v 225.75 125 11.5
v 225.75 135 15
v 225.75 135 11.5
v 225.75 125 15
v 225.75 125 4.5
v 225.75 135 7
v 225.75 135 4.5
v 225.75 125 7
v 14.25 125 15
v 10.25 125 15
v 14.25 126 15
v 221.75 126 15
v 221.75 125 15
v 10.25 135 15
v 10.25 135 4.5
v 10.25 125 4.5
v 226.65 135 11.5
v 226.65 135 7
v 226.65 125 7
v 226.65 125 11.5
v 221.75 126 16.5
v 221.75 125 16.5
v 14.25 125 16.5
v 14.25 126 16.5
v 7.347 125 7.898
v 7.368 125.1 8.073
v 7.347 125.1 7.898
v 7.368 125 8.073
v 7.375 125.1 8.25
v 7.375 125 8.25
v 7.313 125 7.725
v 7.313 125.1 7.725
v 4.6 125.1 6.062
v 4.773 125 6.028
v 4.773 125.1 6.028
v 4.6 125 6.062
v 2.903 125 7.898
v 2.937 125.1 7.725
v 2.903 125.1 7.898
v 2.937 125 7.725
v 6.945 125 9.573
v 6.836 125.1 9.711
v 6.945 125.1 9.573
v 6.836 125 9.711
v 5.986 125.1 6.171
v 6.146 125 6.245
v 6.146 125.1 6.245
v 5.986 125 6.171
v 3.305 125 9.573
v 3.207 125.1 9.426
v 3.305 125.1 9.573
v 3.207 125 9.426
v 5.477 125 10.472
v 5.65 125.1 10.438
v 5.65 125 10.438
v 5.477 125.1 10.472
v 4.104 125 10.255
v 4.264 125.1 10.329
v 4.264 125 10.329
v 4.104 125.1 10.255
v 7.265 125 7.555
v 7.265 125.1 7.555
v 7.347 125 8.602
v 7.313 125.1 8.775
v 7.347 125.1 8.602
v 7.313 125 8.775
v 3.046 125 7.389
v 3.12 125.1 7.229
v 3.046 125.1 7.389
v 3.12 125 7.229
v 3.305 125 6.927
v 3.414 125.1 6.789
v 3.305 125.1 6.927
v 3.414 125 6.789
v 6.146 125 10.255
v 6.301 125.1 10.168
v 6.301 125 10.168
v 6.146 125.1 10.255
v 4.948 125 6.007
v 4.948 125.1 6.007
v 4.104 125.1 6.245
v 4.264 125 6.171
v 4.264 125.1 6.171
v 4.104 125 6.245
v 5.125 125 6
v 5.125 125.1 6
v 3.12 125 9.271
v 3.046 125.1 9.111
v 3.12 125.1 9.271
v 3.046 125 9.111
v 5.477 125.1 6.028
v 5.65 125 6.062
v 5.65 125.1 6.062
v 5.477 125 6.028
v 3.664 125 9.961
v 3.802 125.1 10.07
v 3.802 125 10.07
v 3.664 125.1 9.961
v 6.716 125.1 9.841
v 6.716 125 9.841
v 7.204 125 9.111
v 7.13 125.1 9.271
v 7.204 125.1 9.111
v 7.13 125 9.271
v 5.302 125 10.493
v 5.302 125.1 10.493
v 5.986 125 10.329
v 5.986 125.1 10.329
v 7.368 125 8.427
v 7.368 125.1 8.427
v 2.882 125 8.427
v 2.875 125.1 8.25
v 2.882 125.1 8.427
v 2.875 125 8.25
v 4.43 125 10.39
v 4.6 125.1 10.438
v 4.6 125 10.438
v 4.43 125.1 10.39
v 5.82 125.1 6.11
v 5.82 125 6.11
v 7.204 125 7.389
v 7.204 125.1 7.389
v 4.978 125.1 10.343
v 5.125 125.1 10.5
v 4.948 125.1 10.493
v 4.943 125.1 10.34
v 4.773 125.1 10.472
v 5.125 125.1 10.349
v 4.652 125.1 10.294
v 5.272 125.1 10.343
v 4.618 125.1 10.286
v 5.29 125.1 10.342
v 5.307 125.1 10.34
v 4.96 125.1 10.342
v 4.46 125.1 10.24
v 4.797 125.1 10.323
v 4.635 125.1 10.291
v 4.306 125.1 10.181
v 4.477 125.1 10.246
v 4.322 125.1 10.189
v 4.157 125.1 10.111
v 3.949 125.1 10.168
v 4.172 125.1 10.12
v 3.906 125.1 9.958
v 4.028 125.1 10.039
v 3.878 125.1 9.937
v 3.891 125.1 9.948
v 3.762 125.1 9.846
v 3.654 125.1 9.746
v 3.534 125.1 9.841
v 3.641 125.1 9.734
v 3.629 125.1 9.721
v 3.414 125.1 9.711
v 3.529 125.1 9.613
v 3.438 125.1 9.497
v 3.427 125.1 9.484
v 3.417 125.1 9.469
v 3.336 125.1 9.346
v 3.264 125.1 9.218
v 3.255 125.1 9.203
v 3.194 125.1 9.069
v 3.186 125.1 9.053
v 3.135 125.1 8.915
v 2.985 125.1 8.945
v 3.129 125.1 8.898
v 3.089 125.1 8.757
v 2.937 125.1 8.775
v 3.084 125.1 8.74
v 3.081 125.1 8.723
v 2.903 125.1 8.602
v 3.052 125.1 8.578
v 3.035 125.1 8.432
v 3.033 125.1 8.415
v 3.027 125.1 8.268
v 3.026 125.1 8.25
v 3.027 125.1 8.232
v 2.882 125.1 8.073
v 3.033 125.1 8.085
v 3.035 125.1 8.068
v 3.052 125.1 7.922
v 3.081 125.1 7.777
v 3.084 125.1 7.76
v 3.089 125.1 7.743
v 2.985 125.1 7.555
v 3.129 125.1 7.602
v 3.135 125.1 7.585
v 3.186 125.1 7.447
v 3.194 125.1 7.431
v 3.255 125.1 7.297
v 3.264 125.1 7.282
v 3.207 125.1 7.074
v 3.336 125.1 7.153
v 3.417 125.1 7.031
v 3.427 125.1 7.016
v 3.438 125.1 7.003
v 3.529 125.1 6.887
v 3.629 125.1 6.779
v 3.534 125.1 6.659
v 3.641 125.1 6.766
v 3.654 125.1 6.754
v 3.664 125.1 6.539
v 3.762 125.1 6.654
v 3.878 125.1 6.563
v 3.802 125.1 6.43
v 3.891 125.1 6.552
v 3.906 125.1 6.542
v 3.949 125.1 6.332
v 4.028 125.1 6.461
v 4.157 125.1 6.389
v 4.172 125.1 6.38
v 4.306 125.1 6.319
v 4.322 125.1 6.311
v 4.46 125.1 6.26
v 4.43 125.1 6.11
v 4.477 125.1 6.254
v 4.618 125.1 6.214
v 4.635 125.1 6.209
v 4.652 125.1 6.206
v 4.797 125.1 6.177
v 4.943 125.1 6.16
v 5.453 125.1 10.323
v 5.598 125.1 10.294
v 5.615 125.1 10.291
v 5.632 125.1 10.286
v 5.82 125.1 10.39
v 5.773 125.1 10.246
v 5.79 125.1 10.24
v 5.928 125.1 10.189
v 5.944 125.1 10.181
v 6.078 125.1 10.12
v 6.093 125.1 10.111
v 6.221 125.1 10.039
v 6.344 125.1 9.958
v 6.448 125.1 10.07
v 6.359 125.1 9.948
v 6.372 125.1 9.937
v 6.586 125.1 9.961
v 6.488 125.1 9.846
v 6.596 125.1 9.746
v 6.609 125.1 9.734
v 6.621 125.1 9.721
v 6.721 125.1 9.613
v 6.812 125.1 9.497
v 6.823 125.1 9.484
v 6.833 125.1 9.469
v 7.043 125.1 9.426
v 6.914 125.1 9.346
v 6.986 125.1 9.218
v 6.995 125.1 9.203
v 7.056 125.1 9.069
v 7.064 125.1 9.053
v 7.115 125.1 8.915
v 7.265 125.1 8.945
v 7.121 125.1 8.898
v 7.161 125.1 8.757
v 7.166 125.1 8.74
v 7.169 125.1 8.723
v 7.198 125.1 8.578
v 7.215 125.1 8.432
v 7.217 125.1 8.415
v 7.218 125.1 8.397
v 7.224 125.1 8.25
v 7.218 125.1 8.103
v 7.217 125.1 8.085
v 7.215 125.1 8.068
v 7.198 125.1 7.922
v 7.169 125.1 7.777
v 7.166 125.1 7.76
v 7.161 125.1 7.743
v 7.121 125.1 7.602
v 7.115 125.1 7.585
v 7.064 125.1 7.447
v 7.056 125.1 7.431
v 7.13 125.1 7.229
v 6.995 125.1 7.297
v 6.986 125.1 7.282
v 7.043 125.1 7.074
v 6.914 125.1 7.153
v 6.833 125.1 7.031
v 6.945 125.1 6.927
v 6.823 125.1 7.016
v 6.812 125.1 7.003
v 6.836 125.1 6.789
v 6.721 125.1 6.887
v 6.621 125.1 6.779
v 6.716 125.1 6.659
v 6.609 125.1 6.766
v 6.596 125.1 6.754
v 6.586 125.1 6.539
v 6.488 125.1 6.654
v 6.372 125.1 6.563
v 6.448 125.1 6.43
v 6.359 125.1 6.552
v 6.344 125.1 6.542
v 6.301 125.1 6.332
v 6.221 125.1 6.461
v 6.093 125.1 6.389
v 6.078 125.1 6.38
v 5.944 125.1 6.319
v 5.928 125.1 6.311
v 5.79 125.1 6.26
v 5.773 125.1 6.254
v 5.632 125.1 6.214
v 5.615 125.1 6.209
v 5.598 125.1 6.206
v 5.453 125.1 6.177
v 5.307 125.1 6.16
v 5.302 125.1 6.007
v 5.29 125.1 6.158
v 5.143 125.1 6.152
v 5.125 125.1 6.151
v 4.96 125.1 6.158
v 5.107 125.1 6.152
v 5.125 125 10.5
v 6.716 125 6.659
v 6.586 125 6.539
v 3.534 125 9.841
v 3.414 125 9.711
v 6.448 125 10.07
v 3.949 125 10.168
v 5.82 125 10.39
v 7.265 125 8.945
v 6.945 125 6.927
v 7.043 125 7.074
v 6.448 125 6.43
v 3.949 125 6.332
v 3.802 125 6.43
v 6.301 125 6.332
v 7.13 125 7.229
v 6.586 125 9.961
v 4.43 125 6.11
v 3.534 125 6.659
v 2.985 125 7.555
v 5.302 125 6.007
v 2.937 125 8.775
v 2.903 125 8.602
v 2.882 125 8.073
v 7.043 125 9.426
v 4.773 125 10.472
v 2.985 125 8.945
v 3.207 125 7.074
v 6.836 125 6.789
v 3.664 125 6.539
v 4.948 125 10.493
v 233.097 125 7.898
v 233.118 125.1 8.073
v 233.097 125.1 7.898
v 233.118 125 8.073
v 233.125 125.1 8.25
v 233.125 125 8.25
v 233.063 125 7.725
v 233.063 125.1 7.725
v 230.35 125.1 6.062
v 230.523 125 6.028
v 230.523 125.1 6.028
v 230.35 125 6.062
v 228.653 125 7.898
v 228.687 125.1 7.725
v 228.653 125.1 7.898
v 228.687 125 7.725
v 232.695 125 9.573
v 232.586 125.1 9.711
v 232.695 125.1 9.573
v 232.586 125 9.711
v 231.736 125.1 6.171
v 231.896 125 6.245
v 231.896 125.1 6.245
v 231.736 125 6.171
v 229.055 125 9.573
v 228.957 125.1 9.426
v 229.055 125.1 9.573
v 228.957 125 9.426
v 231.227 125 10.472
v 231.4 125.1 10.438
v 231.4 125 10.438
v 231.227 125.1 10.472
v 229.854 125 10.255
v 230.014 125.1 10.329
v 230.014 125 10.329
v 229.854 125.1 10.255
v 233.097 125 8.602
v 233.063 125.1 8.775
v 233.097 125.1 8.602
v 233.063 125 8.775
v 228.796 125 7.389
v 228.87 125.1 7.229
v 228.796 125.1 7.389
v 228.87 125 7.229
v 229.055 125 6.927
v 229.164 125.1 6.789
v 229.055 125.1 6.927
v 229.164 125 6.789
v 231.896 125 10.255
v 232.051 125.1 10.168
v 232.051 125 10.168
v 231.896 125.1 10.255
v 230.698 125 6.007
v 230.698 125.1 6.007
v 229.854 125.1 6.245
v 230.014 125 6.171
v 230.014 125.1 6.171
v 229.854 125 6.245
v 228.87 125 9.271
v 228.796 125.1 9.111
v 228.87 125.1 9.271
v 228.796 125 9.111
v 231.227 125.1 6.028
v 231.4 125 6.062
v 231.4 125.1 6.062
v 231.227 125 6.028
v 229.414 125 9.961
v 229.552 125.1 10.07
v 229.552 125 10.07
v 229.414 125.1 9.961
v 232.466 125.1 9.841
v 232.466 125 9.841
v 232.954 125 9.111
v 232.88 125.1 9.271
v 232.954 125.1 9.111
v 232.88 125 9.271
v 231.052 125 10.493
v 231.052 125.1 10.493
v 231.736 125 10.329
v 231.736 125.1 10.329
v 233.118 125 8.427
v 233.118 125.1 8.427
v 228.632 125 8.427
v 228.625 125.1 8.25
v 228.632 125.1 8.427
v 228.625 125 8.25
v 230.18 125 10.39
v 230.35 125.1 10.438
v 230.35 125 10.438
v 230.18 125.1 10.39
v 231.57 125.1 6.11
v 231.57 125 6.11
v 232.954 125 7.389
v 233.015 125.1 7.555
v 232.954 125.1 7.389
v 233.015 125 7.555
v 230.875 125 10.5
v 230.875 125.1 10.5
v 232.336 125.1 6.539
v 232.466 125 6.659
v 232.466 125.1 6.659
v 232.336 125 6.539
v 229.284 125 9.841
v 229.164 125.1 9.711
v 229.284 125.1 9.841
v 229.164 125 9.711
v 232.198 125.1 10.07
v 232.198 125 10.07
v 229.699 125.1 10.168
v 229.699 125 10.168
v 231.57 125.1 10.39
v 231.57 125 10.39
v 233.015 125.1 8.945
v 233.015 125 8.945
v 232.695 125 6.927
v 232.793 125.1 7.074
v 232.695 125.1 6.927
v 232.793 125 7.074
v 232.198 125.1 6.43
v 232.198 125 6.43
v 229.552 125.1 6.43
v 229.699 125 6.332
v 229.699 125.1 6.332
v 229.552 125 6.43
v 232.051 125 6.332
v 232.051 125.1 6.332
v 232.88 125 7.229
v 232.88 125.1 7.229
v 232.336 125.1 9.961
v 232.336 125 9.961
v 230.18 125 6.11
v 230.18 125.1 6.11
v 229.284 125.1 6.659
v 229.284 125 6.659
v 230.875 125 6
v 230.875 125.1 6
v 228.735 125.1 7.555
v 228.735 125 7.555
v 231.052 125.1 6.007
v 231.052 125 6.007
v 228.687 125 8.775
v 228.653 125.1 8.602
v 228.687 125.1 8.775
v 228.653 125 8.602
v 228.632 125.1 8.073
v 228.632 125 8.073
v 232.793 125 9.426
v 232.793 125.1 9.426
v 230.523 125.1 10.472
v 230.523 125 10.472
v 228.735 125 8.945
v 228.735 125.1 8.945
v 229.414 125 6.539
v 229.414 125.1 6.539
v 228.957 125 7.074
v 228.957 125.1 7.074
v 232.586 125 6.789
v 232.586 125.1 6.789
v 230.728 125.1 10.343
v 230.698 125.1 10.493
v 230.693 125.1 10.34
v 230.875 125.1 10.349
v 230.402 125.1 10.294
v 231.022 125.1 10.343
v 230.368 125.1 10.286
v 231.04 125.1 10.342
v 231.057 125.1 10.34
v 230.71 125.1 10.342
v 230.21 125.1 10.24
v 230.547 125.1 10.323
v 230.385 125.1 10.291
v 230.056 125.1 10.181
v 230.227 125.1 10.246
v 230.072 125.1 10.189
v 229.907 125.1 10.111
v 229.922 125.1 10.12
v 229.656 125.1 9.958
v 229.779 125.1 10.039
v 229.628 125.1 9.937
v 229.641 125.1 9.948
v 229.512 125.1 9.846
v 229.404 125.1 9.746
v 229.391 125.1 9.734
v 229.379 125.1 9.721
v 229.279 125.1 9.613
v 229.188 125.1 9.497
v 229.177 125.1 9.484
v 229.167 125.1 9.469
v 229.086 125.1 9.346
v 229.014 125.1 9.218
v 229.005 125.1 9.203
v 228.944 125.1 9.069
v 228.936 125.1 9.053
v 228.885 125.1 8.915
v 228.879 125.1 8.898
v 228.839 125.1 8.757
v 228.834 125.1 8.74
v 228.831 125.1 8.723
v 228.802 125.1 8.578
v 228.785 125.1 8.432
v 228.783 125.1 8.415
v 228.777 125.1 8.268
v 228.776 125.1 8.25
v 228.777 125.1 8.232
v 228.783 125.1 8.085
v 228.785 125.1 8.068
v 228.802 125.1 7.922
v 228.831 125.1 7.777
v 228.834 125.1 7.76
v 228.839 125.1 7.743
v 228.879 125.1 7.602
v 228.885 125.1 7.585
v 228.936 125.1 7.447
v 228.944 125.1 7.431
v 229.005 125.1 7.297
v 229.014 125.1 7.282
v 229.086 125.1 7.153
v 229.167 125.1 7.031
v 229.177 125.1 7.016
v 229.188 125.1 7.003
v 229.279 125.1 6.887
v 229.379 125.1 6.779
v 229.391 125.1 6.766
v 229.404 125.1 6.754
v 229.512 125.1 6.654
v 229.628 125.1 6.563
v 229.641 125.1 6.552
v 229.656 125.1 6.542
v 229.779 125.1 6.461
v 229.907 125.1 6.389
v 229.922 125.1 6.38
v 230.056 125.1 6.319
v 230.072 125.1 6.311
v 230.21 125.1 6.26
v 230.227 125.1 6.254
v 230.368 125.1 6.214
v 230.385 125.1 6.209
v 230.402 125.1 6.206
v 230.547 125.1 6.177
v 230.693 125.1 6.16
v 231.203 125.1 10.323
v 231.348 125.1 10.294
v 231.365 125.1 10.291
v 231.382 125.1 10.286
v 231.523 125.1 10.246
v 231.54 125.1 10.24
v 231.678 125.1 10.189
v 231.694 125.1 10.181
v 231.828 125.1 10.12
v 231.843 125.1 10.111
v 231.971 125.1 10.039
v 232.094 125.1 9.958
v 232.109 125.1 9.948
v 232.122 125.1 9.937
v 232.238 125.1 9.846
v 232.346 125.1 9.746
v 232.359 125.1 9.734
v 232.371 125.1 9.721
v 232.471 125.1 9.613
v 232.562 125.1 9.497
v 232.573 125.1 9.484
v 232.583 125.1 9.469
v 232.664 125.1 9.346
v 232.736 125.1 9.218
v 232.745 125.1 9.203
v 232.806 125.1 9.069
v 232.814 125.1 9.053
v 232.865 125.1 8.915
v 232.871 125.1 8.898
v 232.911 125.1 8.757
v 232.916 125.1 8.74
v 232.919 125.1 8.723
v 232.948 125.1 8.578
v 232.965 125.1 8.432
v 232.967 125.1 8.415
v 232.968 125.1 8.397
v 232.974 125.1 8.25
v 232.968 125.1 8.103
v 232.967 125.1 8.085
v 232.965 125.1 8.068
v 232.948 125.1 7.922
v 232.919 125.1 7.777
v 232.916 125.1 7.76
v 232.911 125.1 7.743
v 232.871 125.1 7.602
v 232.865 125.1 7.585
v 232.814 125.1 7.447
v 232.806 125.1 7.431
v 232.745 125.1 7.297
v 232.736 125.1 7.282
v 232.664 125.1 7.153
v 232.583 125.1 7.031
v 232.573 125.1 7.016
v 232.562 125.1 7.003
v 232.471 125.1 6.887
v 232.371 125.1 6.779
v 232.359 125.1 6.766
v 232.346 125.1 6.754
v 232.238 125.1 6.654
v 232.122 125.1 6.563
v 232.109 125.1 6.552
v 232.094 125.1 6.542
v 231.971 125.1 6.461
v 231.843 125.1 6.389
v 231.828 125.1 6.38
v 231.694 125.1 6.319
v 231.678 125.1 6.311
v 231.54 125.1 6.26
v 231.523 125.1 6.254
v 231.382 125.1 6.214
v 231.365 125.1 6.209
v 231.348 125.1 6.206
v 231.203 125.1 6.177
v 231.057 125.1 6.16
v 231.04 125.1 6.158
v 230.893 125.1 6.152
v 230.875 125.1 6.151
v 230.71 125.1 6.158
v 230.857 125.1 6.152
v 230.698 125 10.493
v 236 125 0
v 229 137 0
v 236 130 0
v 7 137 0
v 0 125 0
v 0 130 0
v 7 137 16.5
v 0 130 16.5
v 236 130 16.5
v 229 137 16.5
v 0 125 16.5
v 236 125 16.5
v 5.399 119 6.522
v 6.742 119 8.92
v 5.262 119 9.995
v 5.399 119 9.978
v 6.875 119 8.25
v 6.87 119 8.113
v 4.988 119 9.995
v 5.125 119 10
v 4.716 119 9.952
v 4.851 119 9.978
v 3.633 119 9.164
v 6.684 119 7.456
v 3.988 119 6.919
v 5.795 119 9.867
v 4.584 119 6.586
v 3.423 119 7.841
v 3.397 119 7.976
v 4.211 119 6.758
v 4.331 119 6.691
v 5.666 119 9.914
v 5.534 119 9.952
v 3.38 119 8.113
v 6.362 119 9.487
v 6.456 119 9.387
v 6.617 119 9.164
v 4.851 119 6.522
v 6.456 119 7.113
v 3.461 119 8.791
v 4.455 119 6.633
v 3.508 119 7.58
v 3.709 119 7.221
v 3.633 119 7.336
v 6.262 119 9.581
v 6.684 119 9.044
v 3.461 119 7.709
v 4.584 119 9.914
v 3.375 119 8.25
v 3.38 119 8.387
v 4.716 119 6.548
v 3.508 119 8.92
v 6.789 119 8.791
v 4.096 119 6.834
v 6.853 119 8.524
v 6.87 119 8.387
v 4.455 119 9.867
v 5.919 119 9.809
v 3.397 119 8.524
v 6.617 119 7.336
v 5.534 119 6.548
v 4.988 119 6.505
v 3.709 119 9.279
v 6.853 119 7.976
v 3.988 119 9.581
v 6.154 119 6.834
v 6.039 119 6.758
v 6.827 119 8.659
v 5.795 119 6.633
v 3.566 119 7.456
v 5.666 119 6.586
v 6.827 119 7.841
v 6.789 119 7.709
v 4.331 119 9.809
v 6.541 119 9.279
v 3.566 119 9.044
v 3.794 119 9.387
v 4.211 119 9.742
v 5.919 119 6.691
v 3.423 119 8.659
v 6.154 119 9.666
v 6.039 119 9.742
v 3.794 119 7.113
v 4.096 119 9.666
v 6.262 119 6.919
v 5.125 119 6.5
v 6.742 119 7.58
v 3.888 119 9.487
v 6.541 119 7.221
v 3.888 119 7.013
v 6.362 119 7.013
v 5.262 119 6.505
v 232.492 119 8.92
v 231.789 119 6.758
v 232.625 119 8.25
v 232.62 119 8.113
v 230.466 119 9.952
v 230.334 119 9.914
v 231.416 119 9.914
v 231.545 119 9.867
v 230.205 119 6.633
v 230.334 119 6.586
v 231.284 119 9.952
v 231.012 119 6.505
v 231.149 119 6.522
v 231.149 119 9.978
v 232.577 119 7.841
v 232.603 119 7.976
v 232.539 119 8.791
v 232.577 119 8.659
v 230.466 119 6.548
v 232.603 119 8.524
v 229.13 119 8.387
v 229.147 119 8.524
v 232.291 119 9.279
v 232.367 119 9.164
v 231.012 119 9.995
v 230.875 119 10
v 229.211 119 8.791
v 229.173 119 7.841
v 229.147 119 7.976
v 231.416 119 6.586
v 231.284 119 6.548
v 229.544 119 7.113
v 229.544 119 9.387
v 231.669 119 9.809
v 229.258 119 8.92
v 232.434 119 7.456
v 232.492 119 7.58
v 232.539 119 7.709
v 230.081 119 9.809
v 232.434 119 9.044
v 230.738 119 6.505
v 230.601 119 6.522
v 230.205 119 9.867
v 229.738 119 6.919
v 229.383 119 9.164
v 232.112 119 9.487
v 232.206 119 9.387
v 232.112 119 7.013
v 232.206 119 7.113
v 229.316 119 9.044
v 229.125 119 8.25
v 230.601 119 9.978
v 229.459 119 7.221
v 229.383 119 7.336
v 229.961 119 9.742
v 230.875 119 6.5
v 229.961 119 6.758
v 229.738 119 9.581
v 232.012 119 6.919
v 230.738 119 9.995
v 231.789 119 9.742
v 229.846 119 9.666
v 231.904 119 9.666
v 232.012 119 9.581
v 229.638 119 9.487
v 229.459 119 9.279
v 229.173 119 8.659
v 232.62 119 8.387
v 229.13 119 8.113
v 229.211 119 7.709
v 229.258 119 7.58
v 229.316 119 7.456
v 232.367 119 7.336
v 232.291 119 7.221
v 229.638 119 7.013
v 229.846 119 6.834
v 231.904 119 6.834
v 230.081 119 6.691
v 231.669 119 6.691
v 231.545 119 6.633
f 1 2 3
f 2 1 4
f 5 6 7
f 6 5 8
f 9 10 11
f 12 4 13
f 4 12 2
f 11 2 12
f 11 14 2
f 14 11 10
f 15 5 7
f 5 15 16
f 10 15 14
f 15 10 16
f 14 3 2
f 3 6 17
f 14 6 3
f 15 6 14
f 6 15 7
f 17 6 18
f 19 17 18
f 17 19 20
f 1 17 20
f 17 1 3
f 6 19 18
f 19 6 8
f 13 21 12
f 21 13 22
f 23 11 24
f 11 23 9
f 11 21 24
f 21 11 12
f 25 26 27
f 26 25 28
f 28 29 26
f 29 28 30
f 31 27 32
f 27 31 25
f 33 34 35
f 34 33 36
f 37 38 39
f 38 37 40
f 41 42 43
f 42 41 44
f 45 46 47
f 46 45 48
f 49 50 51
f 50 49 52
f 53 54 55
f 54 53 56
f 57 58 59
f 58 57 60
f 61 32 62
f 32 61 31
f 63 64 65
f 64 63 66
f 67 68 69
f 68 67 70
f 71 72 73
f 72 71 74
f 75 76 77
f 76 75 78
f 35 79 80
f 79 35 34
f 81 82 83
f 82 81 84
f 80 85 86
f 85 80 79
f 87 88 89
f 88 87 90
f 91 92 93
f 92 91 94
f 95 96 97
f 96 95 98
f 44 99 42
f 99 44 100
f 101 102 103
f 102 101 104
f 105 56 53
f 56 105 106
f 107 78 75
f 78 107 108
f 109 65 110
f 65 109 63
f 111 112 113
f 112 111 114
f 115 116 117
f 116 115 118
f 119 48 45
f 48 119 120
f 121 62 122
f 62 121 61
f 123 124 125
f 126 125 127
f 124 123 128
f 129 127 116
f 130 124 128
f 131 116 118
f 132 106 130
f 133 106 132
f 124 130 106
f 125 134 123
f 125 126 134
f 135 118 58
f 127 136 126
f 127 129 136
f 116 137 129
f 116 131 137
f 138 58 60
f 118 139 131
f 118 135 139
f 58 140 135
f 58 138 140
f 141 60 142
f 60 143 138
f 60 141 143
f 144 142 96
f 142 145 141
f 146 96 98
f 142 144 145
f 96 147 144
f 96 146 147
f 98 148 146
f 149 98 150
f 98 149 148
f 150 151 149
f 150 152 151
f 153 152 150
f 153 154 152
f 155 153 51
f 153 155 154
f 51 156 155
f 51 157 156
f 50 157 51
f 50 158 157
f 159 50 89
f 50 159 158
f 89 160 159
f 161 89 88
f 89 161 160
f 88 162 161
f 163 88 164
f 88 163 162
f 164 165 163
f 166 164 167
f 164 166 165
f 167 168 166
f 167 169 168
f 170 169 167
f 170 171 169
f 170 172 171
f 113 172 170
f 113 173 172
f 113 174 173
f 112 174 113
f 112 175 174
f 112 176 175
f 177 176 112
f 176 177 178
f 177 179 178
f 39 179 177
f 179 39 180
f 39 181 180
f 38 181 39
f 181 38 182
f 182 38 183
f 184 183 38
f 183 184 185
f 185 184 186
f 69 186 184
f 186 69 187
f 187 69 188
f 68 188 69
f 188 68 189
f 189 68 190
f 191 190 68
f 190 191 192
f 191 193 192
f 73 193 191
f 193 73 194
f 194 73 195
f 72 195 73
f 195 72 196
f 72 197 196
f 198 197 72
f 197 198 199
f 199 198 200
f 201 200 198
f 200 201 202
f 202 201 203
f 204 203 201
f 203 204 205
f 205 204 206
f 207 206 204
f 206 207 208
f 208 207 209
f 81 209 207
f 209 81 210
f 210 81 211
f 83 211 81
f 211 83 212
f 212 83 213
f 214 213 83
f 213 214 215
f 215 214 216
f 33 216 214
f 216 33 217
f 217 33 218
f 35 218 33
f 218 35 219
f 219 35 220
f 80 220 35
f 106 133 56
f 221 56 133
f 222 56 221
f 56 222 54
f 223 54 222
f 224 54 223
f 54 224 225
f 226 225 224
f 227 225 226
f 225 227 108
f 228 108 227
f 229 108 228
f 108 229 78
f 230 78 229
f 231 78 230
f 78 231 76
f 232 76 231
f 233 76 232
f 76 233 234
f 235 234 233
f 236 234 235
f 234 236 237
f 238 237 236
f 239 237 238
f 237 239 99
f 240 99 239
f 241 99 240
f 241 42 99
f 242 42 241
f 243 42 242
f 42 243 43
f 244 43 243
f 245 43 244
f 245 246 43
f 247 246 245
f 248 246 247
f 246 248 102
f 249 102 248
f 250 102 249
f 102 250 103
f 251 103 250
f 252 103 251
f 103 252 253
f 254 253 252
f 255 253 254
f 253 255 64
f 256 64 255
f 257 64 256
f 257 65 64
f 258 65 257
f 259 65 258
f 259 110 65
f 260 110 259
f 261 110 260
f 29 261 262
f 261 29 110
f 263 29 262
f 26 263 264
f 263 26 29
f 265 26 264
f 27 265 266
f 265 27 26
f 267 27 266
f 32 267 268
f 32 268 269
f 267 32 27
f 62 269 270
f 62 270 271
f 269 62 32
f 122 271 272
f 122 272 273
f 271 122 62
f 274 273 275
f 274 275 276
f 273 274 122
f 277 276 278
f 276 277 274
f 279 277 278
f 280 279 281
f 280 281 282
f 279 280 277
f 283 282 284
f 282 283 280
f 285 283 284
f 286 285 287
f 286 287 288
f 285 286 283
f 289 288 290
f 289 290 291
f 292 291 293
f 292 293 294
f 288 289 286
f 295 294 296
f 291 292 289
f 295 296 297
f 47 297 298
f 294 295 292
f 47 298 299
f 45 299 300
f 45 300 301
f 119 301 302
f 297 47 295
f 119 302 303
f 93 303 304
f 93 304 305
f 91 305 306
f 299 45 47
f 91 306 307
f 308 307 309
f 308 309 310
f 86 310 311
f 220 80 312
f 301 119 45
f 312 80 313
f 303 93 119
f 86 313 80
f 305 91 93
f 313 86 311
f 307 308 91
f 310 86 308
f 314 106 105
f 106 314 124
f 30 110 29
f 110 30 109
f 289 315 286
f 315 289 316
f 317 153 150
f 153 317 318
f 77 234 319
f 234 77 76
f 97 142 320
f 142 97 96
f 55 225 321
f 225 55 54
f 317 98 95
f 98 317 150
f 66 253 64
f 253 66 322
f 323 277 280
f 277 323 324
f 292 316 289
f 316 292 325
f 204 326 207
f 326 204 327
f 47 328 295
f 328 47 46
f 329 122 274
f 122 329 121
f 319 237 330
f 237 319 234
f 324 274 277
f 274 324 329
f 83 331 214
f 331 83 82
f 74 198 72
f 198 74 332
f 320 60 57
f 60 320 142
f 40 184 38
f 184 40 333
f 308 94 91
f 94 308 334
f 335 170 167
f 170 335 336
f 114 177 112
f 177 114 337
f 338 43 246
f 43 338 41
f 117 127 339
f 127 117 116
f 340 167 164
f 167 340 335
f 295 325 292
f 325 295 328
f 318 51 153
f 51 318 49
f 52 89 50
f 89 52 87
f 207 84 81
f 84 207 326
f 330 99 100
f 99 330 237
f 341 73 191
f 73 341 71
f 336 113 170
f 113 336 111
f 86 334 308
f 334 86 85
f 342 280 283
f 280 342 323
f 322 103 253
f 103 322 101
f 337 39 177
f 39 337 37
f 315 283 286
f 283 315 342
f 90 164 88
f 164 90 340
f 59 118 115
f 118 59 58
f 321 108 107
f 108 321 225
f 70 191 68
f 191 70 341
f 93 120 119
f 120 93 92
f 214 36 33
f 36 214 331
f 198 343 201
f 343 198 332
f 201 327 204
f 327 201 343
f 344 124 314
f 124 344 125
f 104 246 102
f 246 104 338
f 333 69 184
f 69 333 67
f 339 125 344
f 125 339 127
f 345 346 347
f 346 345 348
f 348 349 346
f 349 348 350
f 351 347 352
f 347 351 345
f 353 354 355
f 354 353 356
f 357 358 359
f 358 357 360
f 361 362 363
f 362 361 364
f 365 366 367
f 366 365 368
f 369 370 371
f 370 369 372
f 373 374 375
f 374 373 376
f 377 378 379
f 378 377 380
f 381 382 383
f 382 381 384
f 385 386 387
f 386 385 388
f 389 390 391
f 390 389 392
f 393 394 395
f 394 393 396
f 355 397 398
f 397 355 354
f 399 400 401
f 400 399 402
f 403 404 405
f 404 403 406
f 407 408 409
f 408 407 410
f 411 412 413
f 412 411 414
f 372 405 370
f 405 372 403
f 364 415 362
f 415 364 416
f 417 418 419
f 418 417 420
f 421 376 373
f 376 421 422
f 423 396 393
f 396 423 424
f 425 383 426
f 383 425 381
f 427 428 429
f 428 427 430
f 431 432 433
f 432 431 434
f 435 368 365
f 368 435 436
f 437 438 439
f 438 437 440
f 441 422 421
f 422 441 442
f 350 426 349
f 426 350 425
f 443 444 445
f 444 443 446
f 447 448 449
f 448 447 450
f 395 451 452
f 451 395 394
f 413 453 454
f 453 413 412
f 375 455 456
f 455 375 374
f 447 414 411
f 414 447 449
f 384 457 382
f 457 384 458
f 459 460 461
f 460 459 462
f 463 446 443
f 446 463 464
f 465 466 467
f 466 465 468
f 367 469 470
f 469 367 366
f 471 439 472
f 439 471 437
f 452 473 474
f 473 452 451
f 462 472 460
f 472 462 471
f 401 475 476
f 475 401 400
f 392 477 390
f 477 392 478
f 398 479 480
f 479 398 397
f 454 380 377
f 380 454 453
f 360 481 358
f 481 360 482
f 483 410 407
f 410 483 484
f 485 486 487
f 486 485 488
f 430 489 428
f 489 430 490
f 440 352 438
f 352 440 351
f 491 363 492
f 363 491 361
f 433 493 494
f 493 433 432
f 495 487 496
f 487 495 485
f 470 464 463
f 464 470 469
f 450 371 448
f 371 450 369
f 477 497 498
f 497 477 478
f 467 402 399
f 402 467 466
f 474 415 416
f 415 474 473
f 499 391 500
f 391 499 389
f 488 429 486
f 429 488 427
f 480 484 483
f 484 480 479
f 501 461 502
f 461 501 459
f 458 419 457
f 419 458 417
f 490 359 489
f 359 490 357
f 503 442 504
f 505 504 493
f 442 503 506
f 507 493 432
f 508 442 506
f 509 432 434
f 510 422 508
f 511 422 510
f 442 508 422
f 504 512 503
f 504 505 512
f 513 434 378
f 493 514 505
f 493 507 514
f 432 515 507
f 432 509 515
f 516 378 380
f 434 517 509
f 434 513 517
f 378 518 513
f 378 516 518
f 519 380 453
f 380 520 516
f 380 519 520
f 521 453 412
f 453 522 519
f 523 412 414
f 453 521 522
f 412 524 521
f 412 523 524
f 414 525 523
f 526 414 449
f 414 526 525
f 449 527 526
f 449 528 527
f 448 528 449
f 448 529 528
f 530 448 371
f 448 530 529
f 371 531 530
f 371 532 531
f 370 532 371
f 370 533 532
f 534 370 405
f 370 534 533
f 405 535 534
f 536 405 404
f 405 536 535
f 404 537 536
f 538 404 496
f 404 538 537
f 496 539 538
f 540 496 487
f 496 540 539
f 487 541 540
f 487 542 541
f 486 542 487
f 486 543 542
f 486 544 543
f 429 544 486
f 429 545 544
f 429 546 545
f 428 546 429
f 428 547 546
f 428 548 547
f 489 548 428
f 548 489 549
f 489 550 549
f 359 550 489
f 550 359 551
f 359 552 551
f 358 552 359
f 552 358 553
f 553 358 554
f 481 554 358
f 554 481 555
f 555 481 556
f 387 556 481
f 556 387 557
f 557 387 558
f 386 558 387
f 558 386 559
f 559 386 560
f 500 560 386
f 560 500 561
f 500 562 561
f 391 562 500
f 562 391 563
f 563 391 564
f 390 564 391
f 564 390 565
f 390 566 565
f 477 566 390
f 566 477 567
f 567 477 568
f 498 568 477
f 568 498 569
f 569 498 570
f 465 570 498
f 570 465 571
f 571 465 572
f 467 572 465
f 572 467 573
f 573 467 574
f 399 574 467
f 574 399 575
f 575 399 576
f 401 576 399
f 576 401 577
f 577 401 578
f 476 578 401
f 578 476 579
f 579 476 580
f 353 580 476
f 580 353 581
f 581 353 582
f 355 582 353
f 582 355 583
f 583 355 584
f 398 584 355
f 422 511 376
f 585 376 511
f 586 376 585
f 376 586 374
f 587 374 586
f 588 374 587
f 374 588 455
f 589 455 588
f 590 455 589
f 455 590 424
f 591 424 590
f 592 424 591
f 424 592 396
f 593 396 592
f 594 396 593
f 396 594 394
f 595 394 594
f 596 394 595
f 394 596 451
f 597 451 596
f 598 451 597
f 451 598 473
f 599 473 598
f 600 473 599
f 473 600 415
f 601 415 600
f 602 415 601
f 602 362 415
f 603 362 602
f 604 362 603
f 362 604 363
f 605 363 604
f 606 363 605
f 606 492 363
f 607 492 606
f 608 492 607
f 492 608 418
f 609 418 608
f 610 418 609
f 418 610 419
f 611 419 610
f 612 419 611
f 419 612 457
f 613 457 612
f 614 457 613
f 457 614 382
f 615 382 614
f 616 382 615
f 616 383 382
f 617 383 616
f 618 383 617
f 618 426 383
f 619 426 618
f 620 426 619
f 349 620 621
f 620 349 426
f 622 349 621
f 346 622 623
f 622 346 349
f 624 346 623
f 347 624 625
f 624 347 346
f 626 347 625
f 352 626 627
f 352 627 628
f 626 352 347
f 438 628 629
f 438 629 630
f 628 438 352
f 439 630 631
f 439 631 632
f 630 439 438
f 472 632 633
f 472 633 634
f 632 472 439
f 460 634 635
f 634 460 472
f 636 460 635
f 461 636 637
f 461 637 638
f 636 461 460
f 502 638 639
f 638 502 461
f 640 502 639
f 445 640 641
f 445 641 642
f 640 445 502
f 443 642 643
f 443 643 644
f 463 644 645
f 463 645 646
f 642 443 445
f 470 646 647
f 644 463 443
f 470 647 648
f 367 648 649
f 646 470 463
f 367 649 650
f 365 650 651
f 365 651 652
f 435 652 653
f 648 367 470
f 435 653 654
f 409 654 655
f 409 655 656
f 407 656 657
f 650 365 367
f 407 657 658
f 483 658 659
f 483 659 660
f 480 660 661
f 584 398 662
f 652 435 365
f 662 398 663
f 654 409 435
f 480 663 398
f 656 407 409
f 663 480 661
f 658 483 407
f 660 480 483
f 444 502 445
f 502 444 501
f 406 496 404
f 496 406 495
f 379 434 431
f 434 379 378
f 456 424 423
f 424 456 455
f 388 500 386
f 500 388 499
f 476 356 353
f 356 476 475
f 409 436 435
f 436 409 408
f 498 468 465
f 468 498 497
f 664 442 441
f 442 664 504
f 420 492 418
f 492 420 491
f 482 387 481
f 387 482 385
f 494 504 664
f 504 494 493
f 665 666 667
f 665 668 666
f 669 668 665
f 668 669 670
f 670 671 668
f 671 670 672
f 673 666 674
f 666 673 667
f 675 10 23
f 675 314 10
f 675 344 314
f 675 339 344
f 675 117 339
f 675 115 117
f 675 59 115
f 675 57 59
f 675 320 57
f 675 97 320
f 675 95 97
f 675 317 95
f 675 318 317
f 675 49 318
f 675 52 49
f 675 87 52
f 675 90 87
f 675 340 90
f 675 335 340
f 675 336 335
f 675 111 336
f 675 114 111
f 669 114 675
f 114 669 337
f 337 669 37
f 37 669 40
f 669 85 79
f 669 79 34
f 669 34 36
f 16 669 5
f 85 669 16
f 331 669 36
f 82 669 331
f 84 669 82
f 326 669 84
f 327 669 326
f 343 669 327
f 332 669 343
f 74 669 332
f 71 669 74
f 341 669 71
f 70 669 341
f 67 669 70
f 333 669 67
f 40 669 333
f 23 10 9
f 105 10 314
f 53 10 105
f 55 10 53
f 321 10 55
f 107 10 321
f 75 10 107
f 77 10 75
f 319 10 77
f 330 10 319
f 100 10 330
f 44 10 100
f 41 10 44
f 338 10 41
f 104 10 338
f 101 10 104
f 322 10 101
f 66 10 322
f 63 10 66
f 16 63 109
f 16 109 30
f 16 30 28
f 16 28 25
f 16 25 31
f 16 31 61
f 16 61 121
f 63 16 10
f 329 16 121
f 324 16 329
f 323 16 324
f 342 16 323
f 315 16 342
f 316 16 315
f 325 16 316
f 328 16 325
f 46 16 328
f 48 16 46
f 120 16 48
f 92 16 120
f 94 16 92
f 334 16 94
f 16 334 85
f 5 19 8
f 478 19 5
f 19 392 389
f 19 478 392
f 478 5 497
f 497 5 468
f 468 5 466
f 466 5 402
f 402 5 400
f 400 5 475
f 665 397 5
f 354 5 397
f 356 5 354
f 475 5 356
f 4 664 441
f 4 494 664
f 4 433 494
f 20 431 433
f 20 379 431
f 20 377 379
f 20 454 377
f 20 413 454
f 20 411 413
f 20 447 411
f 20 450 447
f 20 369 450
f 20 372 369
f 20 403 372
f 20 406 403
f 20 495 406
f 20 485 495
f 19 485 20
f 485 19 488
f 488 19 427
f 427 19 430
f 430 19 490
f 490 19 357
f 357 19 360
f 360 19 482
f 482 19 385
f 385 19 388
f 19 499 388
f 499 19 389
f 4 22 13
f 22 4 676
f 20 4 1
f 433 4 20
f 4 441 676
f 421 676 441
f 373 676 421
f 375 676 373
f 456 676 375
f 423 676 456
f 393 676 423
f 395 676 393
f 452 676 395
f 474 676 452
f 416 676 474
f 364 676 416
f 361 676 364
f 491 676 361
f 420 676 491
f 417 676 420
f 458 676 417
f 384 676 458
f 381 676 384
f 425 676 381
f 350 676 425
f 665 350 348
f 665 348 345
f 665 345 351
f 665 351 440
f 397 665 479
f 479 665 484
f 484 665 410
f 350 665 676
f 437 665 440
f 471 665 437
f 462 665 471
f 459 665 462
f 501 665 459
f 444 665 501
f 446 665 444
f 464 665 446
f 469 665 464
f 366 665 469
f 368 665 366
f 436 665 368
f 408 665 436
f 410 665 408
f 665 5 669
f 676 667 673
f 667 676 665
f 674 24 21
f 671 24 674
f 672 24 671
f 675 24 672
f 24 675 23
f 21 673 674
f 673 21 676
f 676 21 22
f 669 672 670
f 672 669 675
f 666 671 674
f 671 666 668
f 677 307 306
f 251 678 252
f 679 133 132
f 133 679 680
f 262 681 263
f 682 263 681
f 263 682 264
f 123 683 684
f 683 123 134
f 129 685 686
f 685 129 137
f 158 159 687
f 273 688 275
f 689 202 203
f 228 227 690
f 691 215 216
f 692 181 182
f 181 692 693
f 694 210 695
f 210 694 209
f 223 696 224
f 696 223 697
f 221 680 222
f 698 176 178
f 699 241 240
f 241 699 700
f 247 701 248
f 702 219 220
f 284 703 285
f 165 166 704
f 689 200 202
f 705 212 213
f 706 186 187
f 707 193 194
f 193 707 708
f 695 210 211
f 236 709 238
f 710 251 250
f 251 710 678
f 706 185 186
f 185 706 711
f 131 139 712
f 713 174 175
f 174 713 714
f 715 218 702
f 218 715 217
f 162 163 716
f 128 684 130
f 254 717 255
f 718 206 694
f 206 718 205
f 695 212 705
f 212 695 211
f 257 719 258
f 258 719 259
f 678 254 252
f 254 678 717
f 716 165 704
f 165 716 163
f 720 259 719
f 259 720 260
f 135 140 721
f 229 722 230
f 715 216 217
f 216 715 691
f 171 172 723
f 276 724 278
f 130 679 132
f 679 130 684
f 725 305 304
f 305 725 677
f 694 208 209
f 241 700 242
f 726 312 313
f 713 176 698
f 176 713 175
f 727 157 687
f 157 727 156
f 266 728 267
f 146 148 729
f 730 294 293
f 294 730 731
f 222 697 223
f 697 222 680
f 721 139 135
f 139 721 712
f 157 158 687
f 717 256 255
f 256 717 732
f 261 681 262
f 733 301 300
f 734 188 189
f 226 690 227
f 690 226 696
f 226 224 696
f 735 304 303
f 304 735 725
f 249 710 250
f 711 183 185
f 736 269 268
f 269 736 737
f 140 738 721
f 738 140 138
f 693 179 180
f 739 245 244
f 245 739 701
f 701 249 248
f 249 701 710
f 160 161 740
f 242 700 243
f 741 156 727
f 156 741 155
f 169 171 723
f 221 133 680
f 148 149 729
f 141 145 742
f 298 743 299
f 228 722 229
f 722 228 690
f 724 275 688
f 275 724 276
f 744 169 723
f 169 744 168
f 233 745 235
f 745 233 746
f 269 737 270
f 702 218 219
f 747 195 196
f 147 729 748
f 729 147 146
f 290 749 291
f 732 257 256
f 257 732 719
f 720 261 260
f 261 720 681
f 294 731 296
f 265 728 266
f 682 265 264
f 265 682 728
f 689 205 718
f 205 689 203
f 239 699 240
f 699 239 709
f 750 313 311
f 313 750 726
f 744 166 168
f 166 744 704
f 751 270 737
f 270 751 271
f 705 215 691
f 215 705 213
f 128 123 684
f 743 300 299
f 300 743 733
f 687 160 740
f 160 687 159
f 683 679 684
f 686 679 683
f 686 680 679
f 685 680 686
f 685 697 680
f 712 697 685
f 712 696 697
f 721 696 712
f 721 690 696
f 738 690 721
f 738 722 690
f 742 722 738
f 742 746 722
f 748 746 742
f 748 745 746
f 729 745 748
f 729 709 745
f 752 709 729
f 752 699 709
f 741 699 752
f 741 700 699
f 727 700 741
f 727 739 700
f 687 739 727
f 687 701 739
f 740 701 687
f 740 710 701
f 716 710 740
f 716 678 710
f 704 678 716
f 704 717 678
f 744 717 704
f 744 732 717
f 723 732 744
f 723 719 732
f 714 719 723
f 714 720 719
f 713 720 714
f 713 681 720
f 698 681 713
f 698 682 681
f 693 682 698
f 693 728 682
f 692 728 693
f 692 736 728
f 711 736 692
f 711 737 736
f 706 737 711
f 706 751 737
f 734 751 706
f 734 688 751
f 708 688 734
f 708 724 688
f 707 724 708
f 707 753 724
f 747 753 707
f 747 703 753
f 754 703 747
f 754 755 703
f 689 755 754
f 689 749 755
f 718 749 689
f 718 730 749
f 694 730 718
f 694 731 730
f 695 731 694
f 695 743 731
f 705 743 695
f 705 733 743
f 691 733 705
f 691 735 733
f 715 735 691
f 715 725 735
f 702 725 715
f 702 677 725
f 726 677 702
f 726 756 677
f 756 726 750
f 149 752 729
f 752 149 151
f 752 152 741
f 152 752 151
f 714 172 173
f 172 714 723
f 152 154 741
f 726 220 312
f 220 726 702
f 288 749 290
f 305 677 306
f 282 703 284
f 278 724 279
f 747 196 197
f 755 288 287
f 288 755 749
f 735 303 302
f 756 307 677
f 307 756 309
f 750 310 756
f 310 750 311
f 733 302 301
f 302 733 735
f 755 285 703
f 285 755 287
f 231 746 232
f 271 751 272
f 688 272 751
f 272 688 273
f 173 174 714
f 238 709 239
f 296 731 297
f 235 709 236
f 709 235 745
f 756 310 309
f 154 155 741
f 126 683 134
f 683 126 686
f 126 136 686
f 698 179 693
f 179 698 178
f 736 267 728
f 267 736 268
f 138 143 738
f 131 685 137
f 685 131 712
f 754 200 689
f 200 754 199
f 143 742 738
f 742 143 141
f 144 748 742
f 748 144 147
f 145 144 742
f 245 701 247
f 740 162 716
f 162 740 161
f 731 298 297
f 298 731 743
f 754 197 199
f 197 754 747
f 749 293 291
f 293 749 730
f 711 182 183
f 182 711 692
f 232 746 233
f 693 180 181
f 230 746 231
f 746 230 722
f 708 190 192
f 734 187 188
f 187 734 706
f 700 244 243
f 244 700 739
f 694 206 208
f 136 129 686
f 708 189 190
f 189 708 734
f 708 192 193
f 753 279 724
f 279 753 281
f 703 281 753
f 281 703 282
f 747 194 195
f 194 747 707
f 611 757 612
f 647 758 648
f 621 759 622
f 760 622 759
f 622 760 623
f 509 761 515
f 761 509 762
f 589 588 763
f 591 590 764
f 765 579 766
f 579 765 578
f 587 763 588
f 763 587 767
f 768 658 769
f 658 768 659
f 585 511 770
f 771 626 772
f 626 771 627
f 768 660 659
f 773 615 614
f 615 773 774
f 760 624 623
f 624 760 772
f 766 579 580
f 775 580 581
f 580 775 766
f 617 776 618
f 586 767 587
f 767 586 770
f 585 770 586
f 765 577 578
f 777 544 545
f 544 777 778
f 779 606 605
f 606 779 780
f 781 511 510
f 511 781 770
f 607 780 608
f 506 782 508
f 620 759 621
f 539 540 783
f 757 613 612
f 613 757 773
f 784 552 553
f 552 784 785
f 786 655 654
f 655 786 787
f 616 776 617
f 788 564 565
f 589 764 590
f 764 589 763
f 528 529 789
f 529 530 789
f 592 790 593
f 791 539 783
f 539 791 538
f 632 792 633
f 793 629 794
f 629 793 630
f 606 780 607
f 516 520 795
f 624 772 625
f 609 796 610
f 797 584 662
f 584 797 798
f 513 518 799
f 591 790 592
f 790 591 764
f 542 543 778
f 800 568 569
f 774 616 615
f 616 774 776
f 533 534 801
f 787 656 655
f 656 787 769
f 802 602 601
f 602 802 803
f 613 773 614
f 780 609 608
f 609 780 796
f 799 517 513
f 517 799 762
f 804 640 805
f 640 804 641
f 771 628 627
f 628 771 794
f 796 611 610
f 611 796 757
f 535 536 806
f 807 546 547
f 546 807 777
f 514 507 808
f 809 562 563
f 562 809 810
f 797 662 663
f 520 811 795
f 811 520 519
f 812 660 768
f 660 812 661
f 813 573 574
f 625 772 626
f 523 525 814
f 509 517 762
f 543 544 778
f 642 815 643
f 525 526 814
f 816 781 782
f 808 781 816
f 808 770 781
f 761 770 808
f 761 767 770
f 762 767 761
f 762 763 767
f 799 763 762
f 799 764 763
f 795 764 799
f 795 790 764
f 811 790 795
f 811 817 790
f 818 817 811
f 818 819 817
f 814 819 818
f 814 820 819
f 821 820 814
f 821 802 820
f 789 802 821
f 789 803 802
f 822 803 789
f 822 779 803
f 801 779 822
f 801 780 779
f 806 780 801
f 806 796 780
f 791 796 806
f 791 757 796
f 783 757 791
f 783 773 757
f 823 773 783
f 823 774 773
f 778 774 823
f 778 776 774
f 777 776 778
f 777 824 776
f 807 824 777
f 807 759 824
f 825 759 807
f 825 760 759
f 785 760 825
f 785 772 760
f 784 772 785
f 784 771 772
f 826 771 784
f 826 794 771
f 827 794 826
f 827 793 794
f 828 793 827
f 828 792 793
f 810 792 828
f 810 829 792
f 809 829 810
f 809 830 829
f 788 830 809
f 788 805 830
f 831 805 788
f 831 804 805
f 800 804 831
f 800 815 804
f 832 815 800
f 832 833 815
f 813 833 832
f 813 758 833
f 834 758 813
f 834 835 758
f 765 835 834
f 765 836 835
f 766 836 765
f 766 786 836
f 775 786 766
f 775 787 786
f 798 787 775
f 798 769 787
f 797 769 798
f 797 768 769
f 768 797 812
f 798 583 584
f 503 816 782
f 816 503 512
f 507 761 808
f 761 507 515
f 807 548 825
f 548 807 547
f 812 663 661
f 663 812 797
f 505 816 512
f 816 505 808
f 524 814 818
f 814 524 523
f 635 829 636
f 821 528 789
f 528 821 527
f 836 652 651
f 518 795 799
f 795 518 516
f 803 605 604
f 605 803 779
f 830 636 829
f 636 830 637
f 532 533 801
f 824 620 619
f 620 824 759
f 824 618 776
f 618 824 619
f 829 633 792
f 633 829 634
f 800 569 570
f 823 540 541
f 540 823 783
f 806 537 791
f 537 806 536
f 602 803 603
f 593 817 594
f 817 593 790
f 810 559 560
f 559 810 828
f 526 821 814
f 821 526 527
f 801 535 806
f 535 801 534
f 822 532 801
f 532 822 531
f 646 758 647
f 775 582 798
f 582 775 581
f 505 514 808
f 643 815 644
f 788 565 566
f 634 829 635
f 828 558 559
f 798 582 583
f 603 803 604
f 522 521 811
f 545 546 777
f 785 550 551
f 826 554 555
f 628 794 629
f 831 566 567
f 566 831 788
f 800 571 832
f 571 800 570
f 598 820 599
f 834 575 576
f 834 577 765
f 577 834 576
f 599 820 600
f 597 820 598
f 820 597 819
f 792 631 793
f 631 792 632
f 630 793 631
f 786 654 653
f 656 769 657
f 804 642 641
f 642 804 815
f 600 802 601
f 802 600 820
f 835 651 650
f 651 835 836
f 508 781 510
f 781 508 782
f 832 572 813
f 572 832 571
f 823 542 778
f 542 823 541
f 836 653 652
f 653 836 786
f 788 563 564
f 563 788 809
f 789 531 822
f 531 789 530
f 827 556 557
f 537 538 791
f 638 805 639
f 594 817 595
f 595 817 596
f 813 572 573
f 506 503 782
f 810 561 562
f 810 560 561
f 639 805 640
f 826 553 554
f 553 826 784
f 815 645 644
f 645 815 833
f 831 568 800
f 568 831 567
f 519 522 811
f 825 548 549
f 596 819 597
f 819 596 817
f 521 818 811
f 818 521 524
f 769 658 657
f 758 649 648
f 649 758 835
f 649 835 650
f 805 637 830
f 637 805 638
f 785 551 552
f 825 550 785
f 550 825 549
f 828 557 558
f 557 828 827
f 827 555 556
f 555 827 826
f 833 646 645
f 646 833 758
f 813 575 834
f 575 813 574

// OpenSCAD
$fn = 80;

boxHeight = 137;
boxWidth = 236;
// boxWidth = 268;   // Should hide just about all the USB plug
boxDepth = 16.5;

// // Cutouts for the fire and the fire display.
// fireWidth = 214.5;
// fireHeight = 132; // bit of padding on top
// fireThickness = 10.5;

// Updated for 2018 (8th gen) Kindle Fire 8 HD (1mm extra width)
fireWidth = 215.5;
fireHeight = 132;
fireThickness = 10.5;

// Cut the body into half.
slicePoint = 125;

// How thick the left and right borders are.
borderWidth = (boxWidth - fireWidth) / 2;

// Set how much of an overlap the borders of the
// case overlap onto the screen
// 20,9 leaves only the display area and no bezel visible
displayXOverlap = 4;  // 20;
// NB: This will effect the cut point
// for cutting the box in two.
displayYOverlap = 9;

// Style of hole in the back. 1=80x80 UK box, 2=Small USB connector, 3=Large
backboxStyle = 3;

topBottomThickness = 3;

useKeyHoleMounts = true;

// Model of the Kindle Fire 8 HD (2017 Spec)
module fireModel() {
  // 2017 spec.
  cube([ 214, 128, 9.9 ]);

  // Display...
  translate([ 20, 9, 9.9 ]) { cube([ 173, 109, 20 ]); }

  // Power button
  translate([ 214, 15, 3 ]) { cube([ 30, 12, 3 ]); }

  // USB plug
  translate([ 214, 35, 0 ]) { cube([ 25, 12, 9 ]); }

  // Headphones
  translate([ 214, 77 - 3, 1 ]) { cube([ 20, 3, 3 ]); }

  // Volume switch
  translate([ 214, 89, 2 ]) { cube([ 10, 23, 4 ]); }

  // Camera
  translate([ 199.5, 64, 9.9 ]) { cylinder(d = 4, h = 40); }
}

module fireBodyCutout() {
  cube([ fireWidth, fireHeight, fireThickness ]);

  // And cut out a small slice on the button edge
  // to prevent the buttons getting pressed.
  translate([ fireWidth - 0.1, 0, 2.5 ]) {
#cube([ 1, fireHeight, 4.5 ]);
  }
}

module fireDisplayCutout() {
  // Offsets are from Landscape Kindle Fire Left (non-camera side)
  displayCutoutWidth = fireWidth - (2 * displayXOverlap);
  displayCutoutHeight = fireHeight - (2 * displayYOverlap);

  // translate([6, 9, 7.7]) {
  translate([ displayXOverlap, displayYOverlap, 7.7 ]) {
    cube([ displayCutoutWidth, displayCutoutHeight, 100 ]);
  }

  // Camera
  translate([ 200, 64, 9.9 ]) { cylinder(d = 5, h = 40); }
}

// Small hole, just enough for a USB B plug.
module smallBackBoxCutout(depth) {
  width = 12;
  height = 8;

  // Placed on Y axis to align with USB cable run
  translate([ (boxWidth - width) / 2, 40, -1 ]) {
    cube([ width, height, depth ]);
  }
}

module standardBackBoxCutout(depth) {
  backBoxSize = 80;  // 80x80
  translate(
      [ (boxWidth - backBoxSize) / 2, (boxHeight - backBoxSize) / 2, -1 ]) {
    cube([ backBoxSize, backBoxSize, depth ]);
  }
}

module largeBackBoxCutout(depth) {
  width = 140;
  height = 110;
  translate([ (boxWidth - width) / 2, slicePoint - height, -1 ]) {
    cube([ width, height, depth ]);
  }
}

module backBoxCutout(depth) {
  if (backboxStyle == 1) {
    standardBackBoxCutout(depth);
  } else if (backboxStyle == 2) {
    smallBackBoxCutout(depth);
  } else if (backboxStyle == 3) {
    largeBackBoxCutout(depth);
  }
}

// Cutouts for top and bottom sections connectors
// using square printed pins (adding pins here
// would result in weak pins)
module topConnectionHolesCutout() {
  // Use cube pins so as they
  // can be printed with stength in the correct axis

  translate([ (borderWidth / 2), slicePoint - 7.9, boxDepth / 2 ]) {
    rotate([ -90, 0, 0 ]) { cylinder(d = 4.5, h = 8); }
  }

  translate([ boxWidth - (borderWidth / 2), slicePoint - 7.9, boxDepth / 2 ]) {
    rotate([ -90, 0, 0 ]) { cylinder(d = 4.5, h = 8); }
  }
}

module addConnectingPins() {
  //
  translate([ (borderWidth / 2), slicePoint - 6, boxDepth / 2 ]) {
    rotate([ -90, 0, 0 ]) { cylinder(d1 = 3.5, d2 = 4.3, h = 7); }
  }

  translate([ boxWidth - (borderWidth / 2), slicePoint - 6, boxDepth / 2 ]) {
    rotate([ -90, 0, 0 ]) { cylinder(d1 = 3.5, d = 4.3, h = 7); }
  }
}

// Cutout for Kindle power switch
module switchCutout() {
  translate([ boxWidth - 20, 22 + 3, 8.5 ]) {
    rotate([ 0, 90, 0 ]) {
      // #cylinder(d=6, h=30);
    }
  }

  translate([ boxWidth - (borderWidth + 0.1), 15 + 3, 2 + 4.5 ]) {
#cube([ borderWidth + 0.2, 13, 5 ]);
  }
}

// Cutout for Kindle USB plug
module usbPlugCutout() {
  translate(
      [ boxWidth - (borderWidth + 0.1), 34.5 + topBottomThickness, 4.5 ]) {
#cube([ borderWidth + 0.2, 15, 9 ]);
  }
}

// Cutout for USB cable.
module usbCableCutout() {
  translate([ boxWidth / 2, 38, 2 ]) {
    rotate([ 0, 90, 0 ]) {
      // #cylinder(d=4, h=(boxWidth/2)+10);
    }
  }

  // Cut out a section for the cable to run through
  // -6 for use with USB B sized hole
  translate([ boxWidth / 2 - 6, 41, 0 ]) {
    translate([ 0, 0, -3.5 ]) {
      rotate([ 45, 0, 0 ]) {
        //   #cube([(boxWidth/2)+10, 6,6]);
      }
    }

    translate([ 0, 0, 2 ]) { cube([ (boxWidth / 2) + 10, 7, 2.51 ]); }

    translate([ 0, 7, 2 ]) {
      rotate([ 35, 0, 0 ]) { cube([ (boxWidth / 2) + 10, 5, 4 ]); }
    }
  }
}

// Cutout for counter sunk screw holes to mount the case on the wall
module mountingHoleCountersunk(x, y) {
  translate([ x, y, -1 ]) { cylinder(d = 5, h = 4); }
  translate([ x, y, 1 ]) { cylinder(d = 5, d2 = 10, h = 4); }
  translate([ x, y, 4.9 ]) { cylinder(d = 10, h = 4); }
}

module oblongHole(x, y, d, h, length) {
  translate([ x, y, 0 ]) {
    // Bottom half
    cylinder(d = d, h = h);

    // Top hald
    translate([ 0, length, 0 ]) { cylinder(d = d, h = h); }
  }

  // rectangle inbetween
  translate([ x - d / 2, y, 0 ]) { cube([ d, length, h ]); }
}

// Flat screws make it easier to adjust
// for level & alignment errors in drilling
module mountingHoleFlat(x, y) {
  if (useKeyHoleMounts) {
    // through hole
    translate([ 0, 0, -1 ]) { oblongHole(x, y, 5, 4, 8); }

    // recess for screwhead to sit in.
    translate([ 0, 0, 1.5 ]) { oblongHole(x, y, 10, 5, 8); }

    // Large opening for screw head to come through.
    translate([ x, y, -1 ]) { cylinder(d = 8, h = 5); }
  } else {
    translate([ x, y, -1 ]) { cylinder(d = 6, h = 4); }
    translate([ x, y, 1.5 ]) { cylinder(d = 14, h = 5); }
  }
}

module mountingHoles() {
  holeY = boxHeight / 2;
  offset = 80;

  // Make it so that the holes are always
  // the same distance apart (and from center)
  // so the box can be resized and not effect
  // hole placement.
  center = (boxWidth / 2);

  // Center holes
  mountingHoleFlat(center - offset, holeY);
  mountingHoleFlat(center + offset, holeY);

  // Top/Bottom holes. Don't include bottom if using eyes
  if (!useKeyHoleMounts) {
    mountingHoleFlat(center - offset, 25);
    mountingHoleFlat(center + offset, 25);
  }

  mountingHoleFlat(center - offset, boxHeight - 25);
  mountingHoleFlat(center + offset, boxHeight - 25);
}

module cutCorners() {
  translate([ 0, -8, 0 ]) {
    rotate([ 0, 0, 45 ]) { cube([ 10, 10, 20 ]); }
  }

  translate([ boxWidth, -8, 0 ]) {
    rotate([ 0, 0, 45 ]) { cube([ 10, 10, 20 ]); }
  }

  translate([ 0, boxHeight - 7, 0 ]) {
    rotate([ 0, 0, 45 ]) { cube([ 10, 10, 20 ]); }
  }

  translate([ boxWidth, boxHeight - 7, 0 ]) {
    rotate([ 0, 0, 45 ]) { cube([ 10, 10, 20 ]); }
  }
}

module mainBody() {
  // Center the Kindle Fire within the case
  xOffset = (boxWidth - fireWidth) / 2;
  echo("Fire xOffset:", xOffset);

  difference() {
    union() { cube([ boxWidth, boxHeight, boxDepth ]); }
    union() {
      // TODO: Make back thicker to allow for screw mounts.
      translate([ xOffset, topBottomThickness, 4.5 ]) {
        fireBodyCutout();
        fireDisplayCutout();
      }

      backBoxCutout(10);

      mountingHoles();

      topConnectionHolesCutout();

      switchCutout();

      usbPlugCutout();

      usbCableCutout();

      cutCorners();
    }
  }
}

module wallMountLower() {
  difference() {
    union() { mainBody(); }
    union() {
      // Cut off just where the top section goes full width
      translate([ -1, slicePoint, -1 ]) { cube([ boxWidth + 10, 100, 20 ]); }
    }
  }
}

module wallMountTop() {
  difference() {
    union() {
      mainBody();
      // Pins/Magnets?
    }
    union() {
      // Cut off just where the top section goes full width
      translate([ -1, 0, -1 ]) { cube([ boxWidth + 10, slicePoint, 20 ]); }
    }
  }
  addConnectingPins();
}

// wallMountLower();
wallMountTop();

// translate([ 13, 3.5, 4.5 ]) {
//   // translate([13+14,3.5,4.5]) {
//   % fireModel();
// }
